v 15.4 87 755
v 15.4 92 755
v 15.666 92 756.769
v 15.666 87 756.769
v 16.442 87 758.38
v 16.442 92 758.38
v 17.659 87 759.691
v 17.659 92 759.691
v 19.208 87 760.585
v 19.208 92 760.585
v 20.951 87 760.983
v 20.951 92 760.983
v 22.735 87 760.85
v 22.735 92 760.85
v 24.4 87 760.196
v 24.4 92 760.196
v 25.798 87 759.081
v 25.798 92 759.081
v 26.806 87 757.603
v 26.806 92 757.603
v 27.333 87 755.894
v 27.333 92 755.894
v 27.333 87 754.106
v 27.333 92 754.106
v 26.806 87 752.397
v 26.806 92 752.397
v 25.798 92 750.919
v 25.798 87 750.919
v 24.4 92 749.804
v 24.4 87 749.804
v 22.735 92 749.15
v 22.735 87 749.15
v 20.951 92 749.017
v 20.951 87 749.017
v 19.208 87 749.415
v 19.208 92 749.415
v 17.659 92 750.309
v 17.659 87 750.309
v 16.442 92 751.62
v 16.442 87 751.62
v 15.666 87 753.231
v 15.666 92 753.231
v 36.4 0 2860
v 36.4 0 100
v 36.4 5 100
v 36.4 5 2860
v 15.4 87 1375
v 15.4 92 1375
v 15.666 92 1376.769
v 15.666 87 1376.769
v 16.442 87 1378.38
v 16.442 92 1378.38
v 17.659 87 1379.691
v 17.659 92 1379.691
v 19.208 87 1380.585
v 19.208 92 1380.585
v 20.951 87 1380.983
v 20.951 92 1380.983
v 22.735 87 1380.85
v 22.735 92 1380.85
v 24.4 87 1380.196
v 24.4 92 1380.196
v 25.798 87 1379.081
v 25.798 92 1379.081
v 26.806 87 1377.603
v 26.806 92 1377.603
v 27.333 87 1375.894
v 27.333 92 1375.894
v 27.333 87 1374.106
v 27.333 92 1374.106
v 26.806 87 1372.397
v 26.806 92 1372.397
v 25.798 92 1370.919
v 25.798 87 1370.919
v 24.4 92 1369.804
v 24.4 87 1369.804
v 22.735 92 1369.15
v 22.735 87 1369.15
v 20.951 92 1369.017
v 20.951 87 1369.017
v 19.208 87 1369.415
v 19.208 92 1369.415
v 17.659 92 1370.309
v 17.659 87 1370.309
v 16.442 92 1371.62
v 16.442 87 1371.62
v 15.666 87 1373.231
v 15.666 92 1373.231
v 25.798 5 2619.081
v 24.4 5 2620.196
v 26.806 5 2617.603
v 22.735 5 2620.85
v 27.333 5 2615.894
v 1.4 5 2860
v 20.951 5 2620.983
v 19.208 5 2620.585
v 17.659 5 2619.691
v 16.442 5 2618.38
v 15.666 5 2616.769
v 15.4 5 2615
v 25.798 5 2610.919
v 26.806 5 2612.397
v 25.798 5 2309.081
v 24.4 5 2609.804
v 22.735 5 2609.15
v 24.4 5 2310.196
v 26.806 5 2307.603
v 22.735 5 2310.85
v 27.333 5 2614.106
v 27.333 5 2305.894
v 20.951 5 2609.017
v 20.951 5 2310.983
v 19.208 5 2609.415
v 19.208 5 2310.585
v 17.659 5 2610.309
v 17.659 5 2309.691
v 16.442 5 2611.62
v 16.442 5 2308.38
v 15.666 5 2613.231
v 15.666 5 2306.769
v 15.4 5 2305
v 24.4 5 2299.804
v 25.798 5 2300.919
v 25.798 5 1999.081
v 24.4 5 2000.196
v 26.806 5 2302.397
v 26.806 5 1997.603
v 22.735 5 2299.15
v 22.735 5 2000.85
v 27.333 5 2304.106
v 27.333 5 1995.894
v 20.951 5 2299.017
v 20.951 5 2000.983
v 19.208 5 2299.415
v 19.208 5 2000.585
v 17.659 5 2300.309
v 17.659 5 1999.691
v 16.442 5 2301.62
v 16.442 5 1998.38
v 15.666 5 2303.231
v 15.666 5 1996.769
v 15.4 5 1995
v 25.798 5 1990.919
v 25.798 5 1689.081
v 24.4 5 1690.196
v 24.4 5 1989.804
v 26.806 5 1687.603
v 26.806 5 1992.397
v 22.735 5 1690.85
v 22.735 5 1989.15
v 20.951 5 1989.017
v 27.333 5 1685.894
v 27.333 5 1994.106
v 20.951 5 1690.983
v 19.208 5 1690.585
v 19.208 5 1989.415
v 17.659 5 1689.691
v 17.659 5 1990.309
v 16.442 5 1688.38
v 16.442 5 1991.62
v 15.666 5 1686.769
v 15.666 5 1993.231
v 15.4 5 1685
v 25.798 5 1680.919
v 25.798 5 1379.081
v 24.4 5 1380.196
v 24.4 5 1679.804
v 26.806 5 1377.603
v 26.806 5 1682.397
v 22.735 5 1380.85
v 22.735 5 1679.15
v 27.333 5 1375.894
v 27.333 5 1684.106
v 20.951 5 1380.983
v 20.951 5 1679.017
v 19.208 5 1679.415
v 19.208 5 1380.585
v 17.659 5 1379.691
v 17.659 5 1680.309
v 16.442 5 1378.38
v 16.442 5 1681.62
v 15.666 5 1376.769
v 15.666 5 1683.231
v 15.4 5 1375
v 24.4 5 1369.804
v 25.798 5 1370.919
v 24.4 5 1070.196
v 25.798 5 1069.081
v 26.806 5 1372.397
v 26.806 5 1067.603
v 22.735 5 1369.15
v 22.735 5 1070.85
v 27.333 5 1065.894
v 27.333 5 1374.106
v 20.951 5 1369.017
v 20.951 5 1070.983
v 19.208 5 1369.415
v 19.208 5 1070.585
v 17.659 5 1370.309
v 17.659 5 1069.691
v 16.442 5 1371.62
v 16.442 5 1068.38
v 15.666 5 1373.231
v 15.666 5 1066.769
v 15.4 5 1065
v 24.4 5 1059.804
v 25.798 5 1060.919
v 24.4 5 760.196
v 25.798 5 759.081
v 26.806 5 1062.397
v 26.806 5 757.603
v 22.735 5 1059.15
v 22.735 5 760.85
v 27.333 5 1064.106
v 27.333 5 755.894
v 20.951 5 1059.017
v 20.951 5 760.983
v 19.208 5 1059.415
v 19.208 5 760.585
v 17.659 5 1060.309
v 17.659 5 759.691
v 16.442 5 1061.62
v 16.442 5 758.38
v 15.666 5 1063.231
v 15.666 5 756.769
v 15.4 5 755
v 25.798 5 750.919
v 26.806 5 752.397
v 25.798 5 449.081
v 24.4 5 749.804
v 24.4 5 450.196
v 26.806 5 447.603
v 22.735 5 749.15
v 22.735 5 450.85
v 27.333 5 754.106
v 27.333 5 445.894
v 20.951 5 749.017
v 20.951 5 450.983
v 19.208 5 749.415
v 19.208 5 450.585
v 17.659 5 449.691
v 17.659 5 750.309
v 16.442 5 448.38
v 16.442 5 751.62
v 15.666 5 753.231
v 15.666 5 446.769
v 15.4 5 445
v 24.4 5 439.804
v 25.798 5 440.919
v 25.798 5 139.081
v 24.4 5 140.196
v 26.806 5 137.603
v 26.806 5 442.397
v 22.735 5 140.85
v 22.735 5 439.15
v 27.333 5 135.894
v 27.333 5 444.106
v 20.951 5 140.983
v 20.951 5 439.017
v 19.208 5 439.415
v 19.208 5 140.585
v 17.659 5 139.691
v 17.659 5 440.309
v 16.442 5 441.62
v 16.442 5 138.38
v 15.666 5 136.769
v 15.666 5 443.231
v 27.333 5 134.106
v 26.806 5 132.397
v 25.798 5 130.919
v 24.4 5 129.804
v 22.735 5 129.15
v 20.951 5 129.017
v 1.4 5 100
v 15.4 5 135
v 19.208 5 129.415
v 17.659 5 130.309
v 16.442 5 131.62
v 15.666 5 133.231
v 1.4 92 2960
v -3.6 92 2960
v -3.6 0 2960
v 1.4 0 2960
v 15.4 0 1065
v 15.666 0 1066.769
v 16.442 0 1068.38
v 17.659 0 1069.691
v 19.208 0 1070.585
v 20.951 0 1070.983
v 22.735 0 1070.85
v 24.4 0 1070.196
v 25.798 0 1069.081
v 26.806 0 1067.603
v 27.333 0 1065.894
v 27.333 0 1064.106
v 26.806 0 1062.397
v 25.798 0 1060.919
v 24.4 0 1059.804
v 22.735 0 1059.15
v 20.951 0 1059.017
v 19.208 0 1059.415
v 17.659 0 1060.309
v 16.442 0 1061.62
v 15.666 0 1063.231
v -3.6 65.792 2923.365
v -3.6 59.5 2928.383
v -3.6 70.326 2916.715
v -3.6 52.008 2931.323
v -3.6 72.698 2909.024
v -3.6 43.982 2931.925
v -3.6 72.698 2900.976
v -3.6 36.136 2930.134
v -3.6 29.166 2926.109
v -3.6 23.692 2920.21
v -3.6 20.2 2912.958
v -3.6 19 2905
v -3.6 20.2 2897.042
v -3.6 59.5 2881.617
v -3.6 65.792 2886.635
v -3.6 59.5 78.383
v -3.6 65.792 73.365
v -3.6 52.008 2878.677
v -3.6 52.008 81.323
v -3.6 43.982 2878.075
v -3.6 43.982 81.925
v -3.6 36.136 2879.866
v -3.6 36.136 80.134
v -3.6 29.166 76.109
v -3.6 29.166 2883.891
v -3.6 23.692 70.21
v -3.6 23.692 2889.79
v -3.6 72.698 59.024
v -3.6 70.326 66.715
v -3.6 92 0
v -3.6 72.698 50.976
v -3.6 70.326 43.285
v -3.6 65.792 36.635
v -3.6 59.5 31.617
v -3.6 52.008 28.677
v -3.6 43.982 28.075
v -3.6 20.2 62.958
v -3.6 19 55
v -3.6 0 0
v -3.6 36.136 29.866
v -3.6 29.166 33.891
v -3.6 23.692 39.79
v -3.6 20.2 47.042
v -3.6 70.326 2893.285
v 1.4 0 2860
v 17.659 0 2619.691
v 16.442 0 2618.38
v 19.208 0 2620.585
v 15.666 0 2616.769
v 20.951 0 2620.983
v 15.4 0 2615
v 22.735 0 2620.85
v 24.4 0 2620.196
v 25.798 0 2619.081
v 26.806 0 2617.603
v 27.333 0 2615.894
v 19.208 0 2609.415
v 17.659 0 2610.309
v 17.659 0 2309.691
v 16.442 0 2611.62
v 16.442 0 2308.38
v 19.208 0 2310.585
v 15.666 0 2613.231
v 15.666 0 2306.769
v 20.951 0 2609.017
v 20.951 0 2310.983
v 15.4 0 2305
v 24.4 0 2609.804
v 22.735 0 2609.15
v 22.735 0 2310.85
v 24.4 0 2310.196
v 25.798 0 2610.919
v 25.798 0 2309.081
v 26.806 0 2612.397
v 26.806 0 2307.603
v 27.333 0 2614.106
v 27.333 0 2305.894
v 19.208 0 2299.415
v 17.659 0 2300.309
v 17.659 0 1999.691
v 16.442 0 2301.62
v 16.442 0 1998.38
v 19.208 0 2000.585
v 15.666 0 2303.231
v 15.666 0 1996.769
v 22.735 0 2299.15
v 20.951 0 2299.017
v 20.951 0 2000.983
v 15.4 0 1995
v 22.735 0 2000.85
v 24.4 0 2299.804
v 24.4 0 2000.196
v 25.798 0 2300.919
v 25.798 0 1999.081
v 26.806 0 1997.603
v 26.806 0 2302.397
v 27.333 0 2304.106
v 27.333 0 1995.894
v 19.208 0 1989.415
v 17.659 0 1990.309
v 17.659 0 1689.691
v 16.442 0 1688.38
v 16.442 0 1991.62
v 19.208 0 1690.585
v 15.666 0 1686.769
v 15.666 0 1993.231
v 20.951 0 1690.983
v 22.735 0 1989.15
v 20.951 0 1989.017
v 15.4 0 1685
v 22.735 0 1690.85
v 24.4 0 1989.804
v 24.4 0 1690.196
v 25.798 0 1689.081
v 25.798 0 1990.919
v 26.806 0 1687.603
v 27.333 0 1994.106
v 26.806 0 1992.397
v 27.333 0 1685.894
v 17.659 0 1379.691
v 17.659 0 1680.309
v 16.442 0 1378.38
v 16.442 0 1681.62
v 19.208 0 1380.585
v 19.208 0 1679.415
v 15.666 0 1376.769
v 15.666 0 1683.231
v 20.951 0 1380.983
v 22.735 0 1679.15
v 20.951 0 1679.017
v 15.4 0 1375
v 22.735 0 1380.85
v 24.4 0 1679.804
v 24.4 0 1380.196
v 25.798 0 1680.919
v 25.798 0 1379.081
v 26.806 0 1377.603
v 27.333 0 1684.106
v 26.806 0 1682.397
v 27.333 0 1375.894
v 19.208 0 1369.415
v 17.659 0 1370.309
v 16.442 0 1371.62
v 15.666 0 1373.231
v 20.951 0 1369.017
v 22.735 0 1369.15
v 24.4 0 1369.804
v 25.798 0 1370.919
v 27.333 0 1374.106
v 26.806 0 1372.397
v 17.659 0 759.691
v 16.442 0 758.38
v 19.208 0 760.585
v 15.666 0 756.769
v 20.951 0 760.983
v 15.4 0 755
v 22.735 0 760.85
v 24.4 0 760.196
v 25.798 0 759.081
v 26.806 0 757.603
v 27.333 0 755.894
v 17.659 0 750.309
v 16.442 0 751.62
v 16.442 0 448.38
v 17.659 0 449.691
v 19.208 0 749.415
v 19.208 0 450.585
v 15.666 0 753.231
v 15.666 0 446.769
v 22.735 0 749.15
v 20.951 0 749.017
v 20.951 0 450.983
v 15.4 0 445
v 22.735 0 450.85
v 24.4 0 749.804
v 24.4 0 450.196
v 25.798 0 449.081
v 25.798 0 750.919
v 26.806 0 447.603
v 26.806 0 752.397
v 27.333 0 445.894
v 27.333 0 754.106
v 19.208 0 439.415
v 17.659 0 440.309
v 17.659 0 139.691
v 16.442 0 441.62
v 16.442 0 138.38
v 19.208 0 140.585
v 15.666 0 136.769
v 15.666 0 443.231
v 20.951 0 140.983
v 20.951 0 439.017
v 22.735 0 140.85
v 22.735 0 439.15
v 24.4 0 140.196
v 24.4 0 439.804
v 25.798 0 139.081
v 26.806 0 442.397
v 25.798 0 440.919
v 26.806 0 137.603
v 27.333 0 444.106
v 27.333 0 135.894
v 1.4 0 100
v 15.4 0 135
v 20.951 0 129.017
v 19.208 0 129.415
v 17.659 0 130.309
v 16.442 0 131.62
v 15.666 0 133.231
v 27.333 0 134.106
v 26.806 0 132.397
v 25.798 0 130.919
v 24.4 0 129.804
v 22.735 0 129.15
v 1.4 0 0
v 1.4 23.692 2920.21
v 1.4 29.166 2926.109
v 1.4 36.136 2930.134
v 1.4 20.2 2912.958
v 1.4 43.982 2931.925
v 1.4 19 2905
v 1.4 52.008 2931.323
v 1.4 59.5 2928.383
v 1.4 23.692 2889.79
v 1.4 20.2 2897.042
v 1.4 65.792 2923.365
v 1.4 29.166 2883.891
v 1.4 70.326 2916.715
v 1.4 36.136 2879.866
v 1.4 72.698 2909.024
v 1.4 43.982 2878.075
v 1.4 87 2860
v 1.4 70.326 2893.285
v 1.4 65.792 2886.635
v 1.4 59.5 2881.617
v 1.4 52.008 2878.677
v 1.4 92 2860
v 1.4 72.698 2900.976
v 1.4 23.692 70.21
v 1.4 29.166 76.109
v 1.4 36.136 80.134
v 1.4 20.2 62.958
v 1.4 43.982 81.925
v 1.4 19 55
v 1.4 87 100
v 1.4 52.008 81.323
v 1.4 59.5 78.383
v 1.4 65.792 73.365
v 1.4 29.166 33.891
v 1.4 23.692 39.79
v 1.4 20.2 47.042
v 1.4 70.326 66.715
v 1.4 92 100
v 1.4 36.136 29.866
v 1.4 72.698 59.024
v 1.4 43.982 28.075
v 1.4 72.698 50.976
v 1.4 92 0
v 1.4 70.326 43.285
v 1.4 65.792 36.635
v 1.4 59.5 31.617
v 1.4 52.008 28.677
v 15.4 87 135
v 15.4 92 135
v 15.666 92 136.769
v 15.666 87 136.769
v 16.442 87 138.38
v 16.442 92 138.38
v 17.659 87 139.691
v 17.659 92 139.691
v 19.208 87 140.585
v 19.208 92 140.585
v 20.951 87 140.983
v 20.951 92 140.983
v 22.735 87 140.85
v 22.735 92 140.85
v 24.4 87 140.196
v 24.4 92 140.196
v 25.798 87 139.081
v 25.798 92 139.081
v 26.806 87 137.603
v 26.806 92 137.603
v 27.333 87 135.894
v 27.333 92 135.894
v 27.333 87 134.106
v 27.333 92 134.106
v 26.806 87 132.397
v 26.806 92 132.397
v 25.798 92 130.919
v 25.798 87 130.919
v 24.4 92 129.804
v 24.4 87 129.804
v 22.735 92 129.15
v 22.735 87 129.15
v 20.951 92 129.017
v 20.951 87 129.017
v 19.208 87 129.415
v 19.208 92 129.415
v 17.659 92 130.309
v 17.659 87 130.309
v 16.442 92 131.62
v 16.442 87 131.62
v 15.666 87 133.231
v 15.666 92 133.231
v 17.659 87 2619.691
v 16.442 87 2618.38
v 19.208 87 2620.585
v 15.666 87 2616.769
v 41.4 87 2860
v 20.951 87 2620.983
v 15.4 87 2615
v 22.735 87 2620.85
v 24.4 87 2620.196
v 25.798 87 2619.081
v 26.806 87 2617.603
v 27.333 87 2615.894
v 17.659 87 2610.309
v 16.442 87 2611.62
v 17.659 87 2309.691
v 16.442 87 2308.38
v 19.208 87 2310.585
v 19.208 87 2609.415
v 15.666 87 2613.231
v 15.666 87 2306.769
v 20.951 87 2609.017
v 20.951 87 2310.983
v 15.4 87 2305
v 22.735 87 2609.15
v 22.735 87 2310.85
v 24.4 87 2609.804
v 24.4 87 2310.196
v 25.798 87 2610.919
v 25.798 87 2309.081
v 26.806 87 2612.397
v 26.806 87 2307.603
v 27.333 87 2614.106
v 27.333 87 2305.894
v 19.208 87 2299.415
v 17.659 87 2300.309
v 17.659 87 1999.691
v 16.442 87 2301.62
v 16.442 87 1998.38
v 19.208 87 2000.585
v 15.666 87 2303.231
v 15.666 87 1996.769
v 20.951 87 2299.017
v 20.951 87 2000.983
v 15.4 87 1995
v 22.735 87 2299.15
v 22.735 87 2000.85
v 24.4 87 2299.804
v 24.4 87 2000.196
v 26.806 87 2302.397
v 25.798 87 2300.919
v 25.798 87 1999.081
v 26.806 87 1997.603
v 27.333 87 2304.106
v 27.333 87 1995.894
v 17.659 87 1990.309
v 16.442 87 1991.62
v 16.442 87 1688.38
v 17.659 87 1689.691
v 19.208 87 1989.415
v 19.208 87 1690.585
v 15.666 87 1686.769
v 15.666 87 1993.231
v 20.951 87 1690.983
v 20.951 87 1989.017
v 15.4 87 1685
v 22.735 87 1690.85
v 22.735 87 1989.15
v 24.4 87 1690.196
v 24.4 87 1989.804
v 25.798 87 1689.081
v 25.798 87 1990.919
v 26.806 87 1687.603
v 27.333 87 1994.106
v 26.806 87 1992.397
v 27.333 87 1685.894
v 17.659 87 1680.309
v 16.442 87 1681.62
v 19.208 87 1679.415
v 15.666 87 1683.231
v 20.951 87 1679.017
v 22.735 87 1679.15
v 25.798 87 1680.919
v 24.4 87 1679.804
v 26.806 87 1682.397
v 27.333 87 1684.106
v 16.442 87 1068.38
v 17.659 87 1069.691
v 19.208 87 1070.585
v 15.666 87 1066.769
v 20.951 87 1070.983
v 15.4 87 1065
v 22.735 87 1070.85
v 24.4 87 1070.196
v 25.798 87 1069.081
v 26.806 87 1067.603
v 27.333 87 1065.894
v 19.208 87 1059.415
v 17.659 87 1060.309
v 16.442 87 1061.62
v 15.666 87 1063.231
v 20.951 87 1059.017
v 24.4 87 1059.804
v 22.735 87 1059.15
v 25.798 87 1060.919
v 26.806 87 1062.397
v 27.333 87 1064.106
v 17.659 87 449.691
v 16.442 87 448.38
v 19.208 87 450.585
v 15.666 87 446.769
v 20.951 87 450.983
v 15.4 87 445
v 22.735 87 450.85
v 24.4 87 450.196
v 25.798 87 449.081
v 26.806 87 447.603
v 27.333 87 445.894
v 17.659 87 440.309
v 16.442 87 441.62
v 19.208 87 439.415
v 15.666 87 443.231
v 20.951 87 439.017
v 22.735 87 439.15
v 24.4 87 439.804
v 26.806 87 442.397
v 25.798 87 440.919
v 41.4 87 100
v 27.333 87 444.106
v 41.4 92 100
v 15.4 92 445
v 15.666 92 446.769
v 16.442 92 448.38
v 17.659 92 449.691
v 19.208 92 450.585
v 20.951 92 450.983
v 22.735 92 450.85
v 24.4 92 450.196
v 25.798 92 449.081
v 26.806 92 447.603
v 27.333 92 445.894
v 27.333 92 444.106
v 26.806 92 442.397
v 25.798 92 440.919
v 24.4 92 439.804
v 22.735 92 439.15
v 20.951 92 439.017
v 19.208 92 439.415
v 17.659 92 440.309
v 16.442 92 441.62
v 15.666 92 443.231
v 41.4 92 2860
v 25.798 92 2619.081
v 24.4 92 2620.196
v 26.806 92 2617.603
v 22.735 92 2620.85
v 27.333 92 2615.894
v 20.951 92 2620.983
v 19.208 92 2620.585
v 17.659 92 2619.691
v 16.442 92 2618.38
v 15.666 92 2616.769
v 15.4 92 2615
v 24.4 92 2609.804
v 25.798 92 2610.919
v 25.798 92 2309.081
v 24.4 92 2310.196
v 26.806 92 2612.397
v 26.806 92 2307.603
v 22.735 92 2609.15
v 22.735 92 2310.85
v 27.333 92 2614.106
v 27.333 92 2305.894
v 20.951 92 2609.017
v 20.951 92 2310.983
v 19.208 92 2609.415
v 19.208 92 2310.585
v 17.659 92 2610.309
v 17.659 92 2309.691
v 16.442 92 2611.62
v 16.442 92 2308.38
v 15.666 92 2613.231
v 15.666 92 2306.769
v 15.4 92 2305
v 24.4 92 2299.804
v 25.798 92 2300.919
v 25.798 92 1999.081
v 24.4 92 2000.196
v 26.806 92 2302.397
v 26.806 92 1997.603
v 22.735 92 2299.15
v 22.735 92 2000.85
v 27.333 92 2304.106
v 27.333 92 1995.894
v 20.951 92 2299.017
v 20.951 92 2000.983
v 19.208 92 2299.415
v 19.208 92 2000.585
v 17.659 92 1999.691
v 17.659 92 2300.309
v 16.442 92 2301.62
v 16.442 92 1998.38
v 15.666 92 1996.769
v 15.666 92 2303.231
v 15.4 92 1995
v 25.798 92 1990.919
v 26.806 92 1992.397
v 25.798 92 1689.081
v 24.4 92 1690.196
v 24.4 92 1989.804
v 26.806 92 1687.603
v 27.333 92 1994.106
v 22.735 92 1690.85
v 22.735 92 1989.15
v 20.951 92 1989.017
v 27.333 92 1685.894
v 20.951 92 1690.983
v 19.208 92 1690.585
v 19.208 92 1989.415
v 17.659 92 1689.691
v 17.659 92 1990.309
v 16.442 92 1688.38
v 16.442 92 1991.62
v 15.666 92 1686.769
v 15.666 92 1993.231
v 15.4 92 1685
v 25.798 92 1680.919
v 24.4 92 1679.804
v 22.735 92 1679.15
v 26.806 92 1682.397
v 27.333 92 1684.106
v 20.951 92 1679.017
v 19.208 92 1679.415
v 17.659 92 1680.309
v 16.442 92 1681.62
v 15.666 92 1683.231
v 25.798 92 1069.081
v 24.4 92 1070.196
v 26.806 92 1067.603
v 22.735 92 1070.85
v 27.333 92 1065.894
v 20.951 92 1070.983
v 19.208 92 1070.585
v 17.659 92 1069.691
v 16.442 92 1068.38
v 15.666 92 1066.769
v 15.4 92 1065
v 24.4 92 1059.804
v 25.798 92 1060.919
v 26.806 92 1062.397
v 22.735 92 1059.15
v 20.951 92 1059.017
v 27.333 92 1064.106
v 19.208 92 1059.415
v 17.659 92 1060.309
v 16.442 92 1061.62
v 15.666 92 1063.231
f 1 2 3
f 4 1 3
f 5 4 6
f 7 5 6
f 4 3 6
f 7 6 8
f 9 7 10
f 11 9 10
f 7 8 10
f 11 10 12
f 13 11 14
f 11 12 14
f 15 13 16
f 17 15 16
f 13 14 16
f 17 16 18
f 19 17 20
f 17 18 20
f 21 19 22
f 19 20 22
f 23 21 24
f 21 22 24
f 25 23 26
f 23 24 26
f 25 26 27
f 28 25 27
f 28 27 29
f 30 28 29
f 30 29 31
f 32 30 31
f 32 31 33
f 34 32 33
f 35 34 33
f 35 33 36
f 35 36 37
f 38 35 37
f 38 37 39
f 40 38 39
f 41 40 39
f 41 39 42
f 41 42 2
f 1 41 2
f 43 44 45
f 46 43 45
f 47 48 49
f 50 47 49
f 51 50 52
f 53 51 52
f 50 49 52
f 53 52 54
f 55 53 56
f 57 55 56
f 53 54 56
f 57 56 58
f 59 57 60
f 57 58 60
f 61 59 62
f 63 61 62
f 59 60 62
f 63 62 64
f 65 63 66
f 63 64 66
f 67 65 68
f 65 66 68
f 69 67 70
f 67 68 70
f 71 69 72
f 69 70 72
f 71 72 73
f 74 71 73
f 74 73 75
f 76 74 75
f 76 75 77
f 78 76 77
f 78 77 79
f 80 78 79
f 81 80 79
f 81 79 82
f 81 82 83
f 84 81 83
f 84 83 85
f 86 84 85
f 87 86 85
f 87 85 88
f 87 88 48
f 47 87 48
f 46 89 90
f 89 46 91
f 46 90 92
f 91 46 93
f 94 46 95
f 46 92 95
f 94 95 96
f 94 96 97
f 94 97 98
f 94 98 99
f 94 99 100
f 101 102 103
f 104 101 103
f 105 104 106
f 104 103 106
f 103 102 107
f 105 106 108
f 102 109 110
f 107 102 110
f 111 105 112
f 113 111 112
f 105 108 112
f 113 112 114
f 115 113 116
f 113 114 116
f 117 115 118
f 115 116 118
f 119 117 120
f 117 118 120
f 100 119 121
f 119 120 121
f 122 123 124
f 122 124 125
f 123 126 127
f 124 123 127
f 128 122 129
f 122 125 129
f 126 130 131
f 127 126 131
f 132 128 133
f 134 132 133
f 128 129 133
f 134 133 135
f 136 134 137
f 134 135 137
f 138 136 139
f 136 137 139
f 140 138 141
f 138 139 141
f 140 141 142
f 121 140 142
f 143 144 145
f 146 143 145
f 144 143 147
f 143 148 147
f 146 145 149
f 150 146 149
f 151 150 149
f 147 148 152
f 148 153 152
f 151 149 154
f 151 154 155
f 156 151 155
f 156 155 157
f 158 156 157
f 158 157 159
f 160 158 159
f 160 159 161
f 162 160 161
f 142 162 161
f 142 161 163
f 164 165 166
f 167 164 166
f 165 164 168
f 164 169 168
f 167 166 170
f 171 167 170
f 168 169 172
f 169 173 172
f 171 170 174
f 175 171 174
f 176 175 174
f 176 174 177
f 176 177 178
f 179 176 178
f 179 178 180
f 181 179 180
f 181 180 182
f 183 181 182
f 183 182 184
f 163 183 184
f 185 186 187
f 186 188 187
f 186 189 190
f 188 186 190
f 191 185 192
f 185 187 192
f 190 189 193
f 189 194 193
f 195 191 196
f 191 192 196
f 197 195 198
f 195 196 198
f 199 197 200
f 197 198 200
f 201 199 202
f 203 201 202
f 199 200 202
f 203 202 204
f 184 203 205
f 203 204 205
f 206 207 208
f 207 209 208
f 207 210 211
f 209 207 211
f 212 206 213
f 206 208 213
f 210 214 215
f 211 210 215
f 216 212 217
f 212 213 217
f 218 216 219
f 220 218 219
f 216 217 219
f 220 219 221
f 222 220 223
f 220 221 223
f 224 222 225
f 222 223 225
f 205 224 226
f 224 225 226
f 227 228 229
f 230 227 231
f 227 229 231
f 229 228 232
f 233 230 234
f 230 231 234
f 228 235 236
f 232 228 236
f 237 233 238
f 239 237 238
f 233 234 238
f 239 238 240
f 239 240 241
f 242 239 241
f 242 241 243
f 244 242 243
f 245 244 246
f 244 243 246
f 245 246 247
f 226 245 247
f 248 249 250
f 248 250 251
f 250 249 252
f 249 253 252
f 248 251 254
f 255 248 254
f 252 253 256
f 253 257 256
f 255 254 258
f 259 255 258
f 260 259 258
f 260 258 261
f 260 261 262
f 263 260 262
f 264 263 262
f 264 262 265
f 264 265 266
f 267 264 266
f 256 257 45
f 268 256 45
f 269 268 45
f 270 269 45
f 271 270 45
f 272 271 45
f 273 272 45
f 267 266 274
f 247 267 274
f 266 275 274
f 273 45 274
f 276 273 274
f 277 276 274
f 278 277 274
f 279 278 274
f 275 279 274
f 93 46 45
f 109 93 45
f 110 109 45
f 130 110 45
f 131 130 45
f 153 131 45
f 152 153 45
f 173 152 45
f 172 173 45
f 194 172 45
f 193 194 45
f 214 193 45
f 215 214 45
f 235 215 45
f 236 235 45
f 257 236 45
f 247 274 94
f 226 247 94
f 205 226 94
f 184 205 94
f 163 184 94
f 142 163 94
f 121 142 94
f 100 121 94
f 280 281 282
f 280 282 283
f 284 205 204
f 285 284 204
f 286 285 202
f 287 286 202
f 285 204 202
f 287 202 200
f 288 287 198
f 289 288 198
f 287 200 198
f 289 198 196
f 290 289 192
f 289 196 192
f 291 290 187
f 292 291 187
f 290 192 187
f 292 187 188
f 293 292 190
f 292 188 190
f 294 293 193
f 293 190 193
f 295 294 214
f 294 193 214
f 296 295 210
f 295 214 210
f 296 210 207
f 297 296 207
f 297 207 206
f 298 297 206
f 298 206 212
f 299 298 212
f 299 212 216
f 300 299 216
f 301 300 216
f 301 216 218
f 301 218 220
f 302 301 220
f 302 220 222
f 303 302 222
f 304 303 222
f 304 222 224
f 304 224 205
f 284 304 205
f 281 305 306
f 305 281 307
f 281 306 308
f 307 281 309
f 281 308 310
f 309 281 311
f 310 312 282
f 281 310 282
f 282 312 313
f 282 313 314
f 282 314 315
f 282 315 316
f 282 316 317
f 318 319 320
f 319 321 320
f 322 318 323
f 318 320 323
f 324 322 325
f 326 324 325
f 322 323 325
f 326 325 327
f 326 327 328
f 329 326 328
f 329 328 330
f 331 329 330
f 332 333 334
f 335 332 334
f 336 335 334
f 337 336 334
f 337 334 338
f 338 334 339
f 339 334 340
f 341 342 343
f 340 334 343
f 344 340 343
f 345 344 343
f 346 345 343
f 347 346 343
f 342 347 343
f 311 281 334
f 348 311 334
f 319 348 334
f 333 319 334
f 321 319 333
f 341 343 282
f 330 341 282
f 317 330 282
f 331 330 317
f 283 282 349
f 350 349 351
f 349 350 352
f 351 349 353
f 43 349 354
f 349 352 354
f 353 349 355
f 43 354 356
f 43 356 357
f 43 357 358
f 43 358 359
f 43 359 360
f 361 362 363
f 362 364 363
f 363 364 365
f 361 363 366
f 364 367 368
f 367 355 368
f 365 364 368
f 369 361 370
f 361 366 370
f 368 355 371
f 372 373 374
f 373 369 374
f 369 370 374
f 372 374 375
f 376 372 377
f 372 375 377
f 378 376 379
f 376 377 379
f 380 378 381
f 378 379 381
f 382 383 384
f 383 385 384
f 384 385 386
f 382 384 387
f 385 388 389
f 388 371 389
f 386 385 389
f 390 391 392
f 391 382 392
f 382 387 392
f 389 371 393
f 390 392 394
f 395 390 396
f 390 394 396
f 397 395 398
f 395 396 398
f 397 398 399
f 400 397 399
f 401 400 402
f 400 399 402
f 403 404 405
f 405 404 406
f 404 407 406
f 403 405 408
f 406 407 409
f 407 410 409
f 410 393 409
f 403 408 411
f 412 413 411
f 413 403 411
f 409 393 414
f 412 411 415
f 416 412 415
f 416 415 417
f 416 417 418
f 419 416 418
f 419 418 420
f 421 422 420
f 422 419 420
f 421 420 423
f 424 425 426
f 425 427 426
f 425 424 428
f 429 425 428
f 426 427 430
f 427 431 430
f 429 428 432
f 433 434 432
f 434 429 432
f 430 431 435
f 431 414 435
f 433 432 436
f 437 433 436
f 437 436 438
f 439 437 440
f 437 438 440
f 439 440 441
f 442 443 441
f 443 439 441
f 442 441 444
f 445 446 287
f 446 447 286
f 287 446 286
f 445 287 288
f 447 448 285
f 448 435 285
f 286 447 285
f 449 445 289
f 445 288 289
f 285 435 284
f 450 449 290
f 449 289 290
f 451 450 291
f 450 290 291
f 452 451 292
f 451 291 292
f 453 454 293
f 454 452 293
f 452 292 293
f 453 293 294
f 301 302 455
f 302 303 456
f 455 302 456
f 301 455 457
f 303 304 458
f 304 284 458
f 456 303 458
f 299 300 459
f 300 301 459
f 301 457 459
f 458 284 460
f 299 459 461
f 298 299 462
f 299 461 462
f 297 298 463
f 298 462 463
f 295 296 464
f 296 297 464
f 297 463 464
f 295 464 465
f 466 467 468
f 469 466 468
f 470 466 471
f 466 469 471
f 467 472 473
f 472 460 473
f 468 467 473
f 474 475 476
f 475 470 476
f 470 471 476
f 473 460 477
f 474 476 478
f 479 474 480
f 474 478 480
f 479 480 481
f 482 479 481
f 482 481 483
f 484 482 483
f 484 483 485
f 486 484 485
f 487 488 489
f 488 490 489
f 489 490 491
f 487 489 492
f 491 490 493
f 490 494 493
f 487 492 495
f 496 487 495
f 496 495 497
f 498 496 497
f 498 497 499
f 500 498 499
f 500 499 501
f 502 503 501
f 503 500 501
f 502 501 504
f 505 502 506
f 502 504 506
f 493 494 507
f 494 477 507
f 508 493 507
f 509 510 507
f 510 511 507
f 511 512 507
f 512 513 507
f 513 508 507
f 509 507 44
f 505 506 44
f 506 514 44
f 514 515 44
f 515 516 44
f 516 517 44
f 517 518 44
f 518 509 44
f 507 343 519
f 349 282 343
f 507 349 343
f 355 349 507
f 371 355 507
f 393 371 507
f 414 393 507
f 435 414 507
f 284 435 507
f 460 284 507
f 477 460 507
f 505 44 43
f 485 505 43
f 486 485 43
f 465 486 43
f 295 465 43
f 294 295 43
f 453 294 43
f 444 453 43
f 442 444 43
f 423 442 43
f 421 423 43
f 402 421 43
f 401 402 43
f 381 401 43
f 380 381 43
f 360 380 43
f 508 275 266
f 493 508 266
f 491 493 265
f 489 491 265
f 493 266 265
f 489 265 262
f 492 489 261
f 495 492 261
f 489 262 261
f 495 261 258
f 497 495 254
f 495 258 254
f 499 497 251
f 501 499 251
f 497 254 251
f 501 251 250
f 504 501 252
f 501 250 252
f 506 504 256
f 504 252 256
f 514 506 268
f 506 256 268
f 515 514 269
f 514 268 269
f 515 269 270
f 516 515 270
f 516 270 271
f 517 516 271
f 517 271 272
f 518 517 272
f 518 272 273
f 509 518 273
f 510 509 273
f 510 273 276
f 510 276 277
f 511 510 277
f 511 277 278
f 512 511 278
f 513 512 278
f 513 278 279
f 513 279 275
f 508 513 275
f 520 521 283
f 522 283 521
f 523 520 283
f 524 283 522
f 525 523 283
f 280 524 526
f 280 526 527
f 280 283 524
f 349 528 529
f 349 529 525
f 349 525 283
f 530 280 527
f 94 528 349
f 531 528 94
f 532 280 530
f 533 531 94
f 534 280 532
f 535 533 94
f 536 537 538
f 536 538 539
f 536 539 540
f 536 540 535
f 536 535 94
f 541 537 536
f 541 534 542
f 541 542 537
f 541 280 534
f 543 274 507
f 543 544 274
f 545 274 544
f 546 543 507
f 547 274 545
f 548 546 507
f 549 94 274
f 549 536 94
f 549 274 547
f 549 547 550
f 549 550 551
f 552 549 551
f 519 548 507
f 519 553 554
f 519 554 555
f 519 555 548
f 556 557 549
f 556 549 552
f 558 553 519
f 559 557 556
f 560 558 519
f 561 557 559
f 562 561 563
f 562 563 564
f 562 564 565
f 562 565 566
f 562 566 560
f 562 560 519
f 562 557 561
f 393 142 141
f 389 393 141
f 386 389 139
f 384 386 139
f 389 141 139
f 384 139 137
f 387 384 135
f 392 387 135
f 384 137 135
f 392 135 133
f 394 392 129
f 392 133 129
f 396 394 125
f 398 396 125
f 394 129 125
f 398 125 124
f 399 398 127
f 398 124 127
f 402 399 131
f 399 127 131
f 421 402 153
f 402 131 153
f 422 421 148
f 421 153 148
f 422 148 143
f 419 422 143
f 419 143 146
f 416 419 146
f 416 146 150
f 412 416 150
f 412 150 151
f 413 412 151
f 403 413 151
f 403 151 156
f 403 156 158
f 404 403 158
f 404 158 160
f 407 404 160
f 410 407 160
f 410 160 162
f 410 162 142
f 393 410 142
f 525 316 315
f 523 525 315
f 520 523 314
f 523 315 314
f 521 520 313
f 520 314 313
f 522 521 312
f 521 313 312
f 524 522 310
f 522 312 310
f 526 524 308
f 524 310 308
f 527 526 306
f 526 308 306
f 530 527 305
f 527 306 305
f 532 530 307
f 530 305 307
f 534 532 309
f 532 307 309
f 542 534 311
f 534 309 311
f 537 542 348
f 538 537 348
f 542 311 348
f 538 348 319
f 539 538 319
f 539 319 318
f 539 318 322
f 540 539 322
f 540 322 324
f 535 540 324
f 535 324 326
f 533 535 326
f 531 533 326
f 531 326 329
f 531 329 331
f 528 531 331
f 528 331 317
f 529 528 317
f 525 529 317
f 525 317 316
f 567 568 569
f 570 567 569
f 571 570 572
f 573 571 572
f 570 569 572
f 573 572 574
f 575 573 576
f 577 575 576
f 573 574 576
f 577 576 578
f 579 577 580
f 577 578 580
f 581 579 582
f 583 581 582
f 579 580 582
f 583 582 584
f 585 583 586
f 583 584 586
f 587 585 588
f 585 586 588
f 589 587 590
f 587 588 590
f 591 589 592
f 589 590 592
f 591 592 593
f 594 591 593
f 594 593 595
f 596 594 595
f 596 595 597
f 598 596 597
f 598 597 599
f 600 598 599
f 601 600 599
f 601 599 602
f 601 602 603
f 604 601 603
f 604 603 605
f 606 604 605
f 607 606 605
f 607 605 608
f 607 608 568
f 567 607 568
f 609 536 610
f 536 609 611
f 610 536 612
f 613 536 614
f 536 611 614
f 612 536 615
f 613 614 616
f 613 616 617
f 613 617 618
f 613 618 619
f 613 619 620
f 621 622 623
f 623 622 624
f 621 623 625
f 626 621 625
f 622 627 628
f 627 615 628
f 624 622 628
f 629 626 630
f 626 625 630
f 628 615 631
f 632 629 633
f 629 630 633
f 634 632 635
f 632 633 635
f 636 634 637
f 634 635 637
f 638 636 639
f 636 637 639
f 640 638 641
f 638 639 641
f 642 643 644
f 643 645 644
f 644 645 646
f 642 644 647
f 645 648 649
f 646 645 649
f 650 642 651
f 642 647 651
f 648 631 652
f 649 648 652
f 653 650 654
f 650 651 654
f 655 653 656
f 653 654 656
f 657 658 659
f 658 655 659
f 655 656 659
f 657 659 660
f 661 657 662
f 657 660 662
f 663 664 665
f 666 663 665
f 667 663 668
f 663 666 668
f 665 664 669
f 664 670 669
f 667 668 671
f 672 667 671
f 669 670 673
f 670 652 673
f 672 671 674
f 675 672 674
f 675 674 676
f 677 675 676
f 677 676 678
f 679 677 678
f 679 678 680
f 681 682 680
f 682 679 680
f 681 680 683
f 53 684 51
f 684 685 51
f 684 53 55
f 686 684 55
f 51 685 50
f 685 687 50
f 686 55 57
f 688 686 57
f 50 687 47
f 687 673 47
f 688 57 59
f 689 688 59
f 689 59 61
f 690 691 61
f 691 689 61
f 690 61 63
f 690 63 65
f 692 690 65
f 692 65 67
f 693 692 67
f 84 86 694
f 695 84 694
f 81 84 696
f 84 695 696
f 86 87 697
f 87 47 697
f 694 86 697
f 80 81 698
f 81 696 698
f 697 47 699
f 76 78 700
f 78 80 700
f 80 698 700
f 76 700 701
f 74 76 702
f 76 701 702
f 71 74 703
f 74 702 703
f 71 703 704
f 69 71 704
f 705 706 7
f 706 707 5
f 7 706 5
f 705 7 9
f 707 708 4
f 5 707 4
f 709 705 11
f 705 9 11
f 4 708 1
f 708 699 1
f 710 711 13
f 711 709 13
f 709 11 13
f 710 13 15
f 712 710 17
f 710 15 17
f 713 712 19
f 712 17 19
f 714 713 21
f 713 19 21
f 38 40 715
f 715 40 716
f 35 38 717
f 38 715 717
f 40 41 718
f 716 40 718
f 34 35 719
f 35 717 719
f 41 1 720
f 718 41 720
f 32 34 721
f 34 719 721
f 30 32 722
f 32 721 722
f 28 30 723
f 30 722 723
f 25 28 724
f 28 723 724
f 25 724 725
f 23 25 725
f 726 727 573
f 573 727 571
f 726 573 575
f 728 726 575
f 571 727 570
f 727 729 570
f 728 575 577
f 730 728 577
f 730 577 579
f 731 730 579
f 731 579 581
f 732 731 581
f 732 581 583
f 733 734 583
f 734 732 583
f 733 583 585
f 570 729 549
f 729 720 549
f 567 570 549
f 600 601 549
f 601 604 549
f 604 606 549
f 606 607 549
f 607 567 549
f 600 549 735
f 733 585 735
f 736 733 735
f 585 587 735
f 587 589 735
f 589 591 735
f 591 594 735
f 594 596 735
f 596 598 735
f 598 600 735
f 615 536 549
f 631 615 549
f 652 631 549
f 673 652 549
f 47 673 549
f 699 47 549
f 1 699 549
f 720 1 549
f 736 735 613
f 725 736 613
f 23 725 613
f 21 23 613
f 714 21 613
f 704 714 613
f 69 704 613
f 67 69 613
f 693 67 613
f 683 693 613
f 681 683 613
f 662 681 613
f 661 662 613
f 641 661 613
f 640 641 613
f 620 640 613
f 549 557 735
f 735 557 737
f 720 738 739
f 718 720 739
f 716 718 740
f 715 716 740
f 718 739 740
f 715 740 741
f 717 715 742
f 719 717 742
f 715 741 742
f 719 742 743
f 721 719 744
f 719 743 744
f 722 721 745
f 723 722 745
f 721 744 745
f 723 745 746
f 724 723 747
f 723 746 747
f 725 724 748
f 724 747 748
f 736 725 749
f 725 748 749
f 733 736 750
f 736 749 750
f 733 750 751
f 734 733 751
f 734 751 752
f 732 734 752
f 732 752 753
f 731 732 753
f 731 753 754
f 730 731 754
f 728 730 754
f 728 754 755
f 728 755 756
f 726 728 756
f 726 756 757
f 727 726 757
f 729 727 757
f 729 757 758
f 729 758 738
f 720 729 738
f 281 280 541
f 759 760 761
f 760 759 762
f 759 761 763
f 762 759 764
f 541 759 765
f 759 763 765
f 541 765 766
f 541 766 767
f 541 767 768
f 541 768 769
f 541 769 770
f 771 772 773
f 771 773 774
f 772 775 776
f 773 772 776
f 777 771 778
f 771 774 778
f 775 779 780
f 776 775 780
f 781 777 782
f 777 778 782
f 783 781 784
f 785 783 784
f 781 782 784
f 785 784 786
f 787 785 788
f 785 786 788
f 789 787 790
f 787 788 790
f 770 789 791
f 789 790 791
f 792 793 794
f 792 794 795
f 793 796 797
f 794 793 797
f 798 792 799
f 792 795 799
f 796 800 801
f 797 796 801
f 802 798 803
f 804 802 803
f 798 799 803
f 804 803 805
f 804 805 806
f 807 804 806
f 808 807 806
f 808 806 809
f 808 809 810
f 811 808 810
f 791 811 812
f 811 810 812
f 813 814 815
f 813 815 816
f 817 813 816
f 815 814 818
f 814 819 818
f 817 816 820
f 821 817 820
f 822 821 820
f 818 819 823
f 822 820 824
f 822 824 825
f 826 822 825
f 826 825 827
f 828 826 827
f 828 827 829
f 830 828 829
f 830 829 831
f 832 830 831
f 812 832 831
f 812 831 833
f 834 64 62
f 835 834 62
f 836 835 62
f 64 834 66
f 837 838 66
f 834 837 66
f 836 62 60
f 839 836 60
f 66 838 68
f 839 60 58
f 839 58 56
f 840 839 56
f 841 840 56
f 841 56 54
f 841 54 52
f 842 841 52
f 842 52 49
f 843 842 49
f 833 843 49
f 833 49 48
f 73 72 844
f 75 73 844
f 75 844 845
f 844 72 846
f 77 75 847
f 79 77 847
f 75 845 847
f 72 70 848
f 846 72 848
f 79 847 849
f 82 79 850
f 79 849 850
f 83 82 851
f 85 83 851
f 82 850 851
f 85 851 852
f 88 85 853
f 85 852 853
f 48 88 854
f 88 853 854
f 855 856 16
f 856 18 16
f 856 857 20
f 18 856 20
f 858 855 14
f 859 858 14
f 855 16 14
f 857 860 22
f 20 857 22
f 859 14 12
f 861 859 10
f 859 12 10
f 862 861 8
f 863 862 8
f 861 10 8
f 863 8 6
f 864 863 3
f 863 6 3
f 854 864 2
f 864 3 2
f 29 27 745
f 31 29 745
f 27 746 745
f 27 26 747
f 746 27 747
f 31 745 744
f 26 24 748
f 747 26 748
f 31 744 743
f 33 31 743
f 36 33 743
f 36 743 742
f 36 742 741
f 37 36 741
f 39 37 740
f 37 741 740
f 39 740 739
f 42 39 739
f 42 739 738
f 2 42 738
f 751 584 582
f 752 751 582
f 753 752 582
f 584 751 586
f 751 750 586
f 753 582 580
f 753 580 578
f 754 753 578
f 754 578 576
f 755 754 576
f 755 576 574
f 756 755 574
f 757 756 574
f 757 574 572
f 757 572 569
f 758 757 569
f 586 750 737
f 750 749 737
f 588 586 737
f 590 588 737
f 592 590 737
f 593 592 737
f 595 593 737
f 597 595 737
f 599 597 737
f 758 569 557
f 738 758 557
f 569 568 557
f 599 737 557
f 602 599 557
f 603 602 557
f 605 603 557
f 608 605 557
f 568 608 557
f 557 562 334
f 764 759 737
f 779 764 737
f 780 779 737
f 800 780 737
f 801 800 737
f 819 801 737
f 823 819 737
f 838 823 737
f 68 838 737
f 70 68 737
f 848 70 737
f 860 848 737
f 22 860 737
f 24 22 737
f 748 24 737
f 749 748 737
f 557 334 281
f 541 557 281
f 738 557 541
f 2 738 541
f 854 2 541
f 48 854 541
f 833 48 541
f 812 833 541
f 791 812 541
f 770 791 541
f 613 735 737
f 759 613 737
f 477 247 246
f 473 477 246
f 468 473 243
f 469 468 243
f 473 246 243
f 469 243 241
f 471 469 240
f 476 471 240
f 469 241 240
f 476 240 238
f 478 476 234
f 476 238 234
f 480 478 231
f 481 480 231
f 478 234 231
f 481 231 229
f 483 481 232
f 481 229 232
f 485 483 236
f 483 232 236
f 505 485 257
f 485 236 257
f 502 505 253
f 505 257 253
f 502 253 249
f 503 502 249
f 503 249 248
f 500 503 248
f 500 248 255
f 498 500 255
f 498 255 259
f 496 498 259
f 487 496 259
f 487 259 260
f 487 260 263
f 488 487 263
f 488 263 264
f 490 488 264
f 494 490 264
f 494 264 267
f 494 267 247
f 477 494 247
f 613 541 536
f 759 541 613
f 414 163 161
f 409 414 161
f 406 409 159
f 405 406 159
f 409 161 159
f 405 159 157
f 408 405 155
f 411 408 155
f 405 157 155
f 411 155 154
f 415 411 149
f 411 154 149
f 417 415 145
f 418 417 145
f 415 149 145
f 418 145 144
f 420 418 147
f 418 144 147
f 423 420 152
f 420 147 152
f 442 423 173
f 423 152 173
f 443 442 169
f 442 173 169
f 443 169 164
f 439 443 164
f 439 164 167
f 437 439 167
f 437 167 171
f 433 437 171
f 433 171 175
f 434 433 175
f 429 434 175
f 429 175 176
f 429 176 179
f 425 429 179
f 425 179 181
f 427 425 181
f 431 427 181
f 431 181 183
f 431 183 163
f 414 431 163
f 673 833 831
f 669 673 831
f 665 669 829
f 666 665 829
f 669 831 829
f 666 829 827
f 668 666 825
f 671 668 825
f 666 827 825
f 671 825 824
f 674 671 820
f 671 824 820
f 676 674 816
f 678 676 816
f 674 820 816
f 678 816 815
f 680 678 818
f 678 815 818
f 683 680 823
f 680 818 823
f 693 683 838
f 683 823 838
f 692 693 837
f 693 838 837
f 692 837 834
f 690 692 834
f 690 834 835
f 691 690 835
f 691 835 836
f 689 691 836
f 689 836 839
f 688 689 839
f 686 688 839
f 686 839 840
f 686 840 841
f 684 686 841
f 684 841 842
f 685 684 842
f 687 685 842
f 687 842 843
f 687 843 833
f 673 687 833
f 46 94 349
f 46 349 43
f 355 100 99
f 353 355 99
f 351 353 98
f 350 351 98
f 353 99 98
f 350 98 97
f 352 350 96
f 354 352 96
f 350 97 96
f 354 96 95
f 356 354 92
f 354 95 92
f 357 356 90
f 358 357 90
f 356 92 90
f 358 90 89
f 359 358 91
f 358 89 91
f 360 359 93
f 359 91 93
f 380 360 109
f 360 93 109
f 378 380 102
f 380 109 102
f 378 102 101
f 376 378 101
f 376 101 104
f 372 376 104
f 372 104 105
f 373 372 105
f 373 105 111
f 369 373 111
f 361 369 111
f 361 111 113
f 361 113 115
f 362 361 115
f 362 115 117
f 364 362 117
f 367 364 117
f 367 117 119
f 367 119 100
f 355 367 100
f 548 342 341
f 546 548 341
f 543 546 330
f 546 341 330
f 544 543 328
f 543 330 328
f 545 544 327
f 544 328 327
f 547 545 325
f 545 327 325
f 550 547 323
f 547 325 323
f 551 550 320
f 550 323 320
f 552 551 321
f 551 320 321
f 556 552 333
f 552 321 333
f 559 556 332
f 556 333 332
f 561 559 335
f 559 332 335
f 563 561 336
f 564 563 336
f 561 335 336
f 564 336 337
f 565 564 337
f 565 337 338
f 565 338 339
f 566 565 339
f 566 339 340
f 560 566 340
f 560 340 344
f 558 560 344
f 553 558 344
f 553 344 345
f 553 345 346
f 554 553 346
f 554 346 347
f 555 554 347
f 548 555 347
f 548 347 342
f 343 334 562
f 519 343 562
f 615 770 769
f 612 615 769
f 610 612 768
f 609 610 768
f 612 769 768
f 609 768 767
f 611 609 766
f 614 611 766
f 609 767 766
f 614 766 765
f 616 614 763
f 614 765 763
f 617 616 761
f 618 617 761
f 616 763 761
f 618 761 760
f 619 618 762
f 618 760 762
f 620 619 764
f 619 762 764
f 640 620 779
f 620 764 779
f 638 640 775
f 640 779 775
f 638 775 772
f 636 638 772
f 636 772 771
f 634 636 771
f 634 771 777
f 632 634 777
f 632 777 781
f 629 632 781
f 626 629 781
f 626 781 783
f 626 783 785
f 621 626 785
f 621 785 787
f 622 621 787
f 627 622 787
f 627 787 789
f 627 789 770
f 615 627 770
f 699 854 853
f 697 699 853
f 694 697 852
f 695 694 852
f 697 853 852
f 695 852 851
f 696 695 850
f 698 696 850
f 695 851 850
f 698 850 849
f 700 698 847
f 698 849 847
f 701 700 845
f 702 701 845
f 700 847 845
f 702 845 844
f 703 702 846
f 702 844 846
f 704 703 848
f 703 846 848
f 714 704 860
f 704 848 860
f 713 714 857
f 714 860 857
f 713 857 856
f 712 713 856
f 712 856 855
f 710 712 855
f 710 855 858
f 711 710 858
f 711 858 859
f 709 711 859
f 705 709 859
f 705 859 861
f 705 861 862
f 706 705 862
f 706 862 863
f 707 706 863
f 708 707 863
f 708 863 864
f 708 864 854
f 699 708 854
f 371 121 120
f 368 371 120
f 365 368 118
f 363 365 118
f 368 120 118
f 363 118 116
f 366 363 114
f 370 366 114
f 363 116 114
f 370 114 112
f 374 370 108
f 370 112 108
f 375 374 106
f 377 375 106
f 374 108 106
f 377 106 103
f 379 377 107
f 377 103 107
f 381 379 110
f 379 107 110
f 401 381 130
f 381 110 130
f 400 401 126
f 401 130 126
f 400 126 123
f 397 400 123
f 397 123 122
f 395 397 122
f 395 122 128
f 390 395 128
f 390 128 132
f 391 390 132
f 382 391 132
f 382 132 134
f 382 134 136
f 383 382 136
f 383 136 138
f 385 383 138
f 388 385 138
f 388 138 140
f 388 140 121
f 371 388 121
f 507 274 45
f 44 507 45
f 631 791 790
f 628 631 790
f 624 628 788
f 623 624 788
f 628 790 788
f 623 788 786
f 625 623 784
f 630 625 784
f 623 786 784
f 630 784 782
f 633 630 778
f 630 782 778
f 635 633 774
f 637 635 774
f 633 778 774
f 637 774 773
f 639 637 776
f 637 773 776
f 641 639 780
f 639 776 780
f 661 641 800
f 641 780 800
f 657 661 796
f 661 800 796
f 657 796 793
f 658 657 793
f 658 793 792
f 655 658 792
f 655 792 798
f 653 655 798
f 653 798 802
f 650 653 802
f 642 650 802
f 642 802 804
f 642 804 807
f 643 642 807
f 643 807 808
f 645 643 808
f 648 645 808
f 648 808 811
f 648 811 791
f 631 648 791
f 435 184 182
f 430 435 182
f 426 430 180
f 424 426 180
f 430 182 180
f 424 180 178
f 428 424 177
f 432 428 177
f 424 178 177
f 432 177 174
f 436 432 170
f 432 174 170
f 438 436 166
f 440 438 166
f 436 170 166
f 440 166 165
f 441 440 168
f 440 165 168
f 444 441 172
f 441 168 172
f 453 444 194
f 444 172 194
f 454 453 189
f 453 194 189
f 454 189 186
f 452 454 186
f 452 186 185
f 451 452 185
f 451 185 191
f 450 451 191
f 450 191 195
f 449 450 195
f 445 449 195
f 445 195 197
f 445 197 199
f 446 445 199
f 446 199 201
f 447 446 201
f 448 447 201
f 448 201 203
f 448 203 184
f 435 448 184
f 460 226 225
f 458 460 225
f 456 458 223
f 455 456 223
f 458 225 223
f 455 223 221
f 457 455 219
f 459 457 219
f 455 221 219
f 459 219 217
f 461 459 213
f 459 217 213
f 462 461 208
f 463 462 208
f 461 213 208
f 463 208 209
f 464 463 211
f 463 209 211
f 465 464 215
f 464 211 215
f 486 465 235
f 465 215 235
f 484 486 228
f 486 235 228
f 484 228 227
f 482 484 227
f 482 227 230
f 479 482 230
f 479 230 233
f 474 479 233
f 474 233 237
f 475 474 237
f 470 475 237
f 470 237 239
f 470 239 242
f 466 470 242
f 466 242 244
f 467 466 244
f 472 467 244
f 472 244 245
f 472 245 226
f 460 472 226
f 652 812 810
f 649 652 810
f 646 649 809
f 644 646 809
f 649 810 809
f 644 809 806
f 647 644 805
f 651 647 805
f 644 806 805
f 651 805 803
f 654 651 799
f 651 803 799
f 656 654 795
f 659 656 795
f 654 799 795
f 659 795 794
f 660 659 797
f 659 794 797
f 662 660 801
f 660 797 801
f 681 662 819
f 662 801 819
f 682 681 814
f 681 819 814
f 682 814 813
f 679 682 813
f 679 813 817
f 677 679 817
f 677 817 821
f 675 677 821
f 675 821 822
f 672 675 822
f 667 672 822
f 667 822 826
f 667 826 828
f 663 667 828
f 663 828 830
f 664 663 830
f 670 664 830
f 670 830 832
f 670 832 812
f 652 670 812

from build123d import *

# Parameters (mm, degrees)
BOSS_EXTRU_1_DEPTH         = 2960
ESQUISSE7_R                = 6
ENL_V_MAT_EXTRU_2_DEPTH    = 2962.718746921
ESQUISSE8_W                = 40
ESQUISSE8_H                = 100
ENL_V_MAT_EXTRU_3_DEPTH    = 2962.718746921
R_P_TITION_LIN_AIRE1_COUNT = 24
R_P_TITION_LIN_AIRE1_PITCH = 310
ESQUISSE9_R                = 27
ENL_V_MAT_EXTRU_4_DEPTH    = 2962.77126058


with BuildPart() as part:
    # Esquisse1 → Boss.-Extru.1 (new body)
    with BuildSketch(Plane.XY):
        Polygon((-3.600291477, 0), (36.399708523, 0), (36.399708523, 5), (1.399708523, 5), (1.399708523, 87), (41.399708523, 87), (41.399708523, 92), (-3.600291477, 92), align=None)
    extrude(amount=BOSS_EXTRU_1_DEPTH)

    # Esquisse7 → Enlèv. mat.-Extru.2 (cut, through all)
    with BuildSketch(Plane(origin=(0, 92, 0), x_dir=(1, 0, 0), z_dir=(0, 1, 0))):
        with Locations(Location((21.399708523, -135, 0), (0, 0, 180))):
            Circle(ESQUISSE7_R)
    enl_v_mat_extru_2 = extrude(amount=-ENL_V_MAT_EXTRU_2_DEPTH, mode=Mode.SUBTRACT)

    # Esquisse8 → Enlèv. mat.-Extru.3 (cut, through all)
    with BuildSketch(Plane(origin=(0, 92, 0), x_dir=(1, 0, 0), z_dir=(0, 1, 0))):
        with Locations((21.399708523, -2910)):
            Rectangle(ESQUISSE8_W, ESQUISSE8_H)
        with Locations((21.399708523, -50)):
            Rectangle(ESQUISSE8_W, ESQUISSE8_H)
    extrude(amount=-ENL_V_MAT_EXTRU_3_DEPTH, mode=Mode.SUBTRACT)

    # Répétition linéaire1: Enlèv. mat.-Extru.2 ×24
    with Locations(*[(0, 0, i * R_P_TITION_LIN_AIRE1_PITCH) for i in range(1, R_P_TITION_LIN_AIRE1_COUNT)]):
        add(enl_v_mat_extru_2, mode=Mode.SUBTRACT)

    # Esquisse9 → Enlèv. mat.-Extru.4 (cut, through all)
    with BuildSketch(Plane.ZY.offset(3.600291477)):
        with Locations(Location((55, 46, 0), (0, 0, 270))):
            Circle(ESQUISSE9_R)
        with Locations(Location((2905, 46, 0), (0, 0, 270))):
            Circle(ESQUISSE9_R)
    extrude(amount=-ENL_V_MAT_EXTRU_4_DEPTH, mode=Mode.SUBTRACT)


solid = part.part
